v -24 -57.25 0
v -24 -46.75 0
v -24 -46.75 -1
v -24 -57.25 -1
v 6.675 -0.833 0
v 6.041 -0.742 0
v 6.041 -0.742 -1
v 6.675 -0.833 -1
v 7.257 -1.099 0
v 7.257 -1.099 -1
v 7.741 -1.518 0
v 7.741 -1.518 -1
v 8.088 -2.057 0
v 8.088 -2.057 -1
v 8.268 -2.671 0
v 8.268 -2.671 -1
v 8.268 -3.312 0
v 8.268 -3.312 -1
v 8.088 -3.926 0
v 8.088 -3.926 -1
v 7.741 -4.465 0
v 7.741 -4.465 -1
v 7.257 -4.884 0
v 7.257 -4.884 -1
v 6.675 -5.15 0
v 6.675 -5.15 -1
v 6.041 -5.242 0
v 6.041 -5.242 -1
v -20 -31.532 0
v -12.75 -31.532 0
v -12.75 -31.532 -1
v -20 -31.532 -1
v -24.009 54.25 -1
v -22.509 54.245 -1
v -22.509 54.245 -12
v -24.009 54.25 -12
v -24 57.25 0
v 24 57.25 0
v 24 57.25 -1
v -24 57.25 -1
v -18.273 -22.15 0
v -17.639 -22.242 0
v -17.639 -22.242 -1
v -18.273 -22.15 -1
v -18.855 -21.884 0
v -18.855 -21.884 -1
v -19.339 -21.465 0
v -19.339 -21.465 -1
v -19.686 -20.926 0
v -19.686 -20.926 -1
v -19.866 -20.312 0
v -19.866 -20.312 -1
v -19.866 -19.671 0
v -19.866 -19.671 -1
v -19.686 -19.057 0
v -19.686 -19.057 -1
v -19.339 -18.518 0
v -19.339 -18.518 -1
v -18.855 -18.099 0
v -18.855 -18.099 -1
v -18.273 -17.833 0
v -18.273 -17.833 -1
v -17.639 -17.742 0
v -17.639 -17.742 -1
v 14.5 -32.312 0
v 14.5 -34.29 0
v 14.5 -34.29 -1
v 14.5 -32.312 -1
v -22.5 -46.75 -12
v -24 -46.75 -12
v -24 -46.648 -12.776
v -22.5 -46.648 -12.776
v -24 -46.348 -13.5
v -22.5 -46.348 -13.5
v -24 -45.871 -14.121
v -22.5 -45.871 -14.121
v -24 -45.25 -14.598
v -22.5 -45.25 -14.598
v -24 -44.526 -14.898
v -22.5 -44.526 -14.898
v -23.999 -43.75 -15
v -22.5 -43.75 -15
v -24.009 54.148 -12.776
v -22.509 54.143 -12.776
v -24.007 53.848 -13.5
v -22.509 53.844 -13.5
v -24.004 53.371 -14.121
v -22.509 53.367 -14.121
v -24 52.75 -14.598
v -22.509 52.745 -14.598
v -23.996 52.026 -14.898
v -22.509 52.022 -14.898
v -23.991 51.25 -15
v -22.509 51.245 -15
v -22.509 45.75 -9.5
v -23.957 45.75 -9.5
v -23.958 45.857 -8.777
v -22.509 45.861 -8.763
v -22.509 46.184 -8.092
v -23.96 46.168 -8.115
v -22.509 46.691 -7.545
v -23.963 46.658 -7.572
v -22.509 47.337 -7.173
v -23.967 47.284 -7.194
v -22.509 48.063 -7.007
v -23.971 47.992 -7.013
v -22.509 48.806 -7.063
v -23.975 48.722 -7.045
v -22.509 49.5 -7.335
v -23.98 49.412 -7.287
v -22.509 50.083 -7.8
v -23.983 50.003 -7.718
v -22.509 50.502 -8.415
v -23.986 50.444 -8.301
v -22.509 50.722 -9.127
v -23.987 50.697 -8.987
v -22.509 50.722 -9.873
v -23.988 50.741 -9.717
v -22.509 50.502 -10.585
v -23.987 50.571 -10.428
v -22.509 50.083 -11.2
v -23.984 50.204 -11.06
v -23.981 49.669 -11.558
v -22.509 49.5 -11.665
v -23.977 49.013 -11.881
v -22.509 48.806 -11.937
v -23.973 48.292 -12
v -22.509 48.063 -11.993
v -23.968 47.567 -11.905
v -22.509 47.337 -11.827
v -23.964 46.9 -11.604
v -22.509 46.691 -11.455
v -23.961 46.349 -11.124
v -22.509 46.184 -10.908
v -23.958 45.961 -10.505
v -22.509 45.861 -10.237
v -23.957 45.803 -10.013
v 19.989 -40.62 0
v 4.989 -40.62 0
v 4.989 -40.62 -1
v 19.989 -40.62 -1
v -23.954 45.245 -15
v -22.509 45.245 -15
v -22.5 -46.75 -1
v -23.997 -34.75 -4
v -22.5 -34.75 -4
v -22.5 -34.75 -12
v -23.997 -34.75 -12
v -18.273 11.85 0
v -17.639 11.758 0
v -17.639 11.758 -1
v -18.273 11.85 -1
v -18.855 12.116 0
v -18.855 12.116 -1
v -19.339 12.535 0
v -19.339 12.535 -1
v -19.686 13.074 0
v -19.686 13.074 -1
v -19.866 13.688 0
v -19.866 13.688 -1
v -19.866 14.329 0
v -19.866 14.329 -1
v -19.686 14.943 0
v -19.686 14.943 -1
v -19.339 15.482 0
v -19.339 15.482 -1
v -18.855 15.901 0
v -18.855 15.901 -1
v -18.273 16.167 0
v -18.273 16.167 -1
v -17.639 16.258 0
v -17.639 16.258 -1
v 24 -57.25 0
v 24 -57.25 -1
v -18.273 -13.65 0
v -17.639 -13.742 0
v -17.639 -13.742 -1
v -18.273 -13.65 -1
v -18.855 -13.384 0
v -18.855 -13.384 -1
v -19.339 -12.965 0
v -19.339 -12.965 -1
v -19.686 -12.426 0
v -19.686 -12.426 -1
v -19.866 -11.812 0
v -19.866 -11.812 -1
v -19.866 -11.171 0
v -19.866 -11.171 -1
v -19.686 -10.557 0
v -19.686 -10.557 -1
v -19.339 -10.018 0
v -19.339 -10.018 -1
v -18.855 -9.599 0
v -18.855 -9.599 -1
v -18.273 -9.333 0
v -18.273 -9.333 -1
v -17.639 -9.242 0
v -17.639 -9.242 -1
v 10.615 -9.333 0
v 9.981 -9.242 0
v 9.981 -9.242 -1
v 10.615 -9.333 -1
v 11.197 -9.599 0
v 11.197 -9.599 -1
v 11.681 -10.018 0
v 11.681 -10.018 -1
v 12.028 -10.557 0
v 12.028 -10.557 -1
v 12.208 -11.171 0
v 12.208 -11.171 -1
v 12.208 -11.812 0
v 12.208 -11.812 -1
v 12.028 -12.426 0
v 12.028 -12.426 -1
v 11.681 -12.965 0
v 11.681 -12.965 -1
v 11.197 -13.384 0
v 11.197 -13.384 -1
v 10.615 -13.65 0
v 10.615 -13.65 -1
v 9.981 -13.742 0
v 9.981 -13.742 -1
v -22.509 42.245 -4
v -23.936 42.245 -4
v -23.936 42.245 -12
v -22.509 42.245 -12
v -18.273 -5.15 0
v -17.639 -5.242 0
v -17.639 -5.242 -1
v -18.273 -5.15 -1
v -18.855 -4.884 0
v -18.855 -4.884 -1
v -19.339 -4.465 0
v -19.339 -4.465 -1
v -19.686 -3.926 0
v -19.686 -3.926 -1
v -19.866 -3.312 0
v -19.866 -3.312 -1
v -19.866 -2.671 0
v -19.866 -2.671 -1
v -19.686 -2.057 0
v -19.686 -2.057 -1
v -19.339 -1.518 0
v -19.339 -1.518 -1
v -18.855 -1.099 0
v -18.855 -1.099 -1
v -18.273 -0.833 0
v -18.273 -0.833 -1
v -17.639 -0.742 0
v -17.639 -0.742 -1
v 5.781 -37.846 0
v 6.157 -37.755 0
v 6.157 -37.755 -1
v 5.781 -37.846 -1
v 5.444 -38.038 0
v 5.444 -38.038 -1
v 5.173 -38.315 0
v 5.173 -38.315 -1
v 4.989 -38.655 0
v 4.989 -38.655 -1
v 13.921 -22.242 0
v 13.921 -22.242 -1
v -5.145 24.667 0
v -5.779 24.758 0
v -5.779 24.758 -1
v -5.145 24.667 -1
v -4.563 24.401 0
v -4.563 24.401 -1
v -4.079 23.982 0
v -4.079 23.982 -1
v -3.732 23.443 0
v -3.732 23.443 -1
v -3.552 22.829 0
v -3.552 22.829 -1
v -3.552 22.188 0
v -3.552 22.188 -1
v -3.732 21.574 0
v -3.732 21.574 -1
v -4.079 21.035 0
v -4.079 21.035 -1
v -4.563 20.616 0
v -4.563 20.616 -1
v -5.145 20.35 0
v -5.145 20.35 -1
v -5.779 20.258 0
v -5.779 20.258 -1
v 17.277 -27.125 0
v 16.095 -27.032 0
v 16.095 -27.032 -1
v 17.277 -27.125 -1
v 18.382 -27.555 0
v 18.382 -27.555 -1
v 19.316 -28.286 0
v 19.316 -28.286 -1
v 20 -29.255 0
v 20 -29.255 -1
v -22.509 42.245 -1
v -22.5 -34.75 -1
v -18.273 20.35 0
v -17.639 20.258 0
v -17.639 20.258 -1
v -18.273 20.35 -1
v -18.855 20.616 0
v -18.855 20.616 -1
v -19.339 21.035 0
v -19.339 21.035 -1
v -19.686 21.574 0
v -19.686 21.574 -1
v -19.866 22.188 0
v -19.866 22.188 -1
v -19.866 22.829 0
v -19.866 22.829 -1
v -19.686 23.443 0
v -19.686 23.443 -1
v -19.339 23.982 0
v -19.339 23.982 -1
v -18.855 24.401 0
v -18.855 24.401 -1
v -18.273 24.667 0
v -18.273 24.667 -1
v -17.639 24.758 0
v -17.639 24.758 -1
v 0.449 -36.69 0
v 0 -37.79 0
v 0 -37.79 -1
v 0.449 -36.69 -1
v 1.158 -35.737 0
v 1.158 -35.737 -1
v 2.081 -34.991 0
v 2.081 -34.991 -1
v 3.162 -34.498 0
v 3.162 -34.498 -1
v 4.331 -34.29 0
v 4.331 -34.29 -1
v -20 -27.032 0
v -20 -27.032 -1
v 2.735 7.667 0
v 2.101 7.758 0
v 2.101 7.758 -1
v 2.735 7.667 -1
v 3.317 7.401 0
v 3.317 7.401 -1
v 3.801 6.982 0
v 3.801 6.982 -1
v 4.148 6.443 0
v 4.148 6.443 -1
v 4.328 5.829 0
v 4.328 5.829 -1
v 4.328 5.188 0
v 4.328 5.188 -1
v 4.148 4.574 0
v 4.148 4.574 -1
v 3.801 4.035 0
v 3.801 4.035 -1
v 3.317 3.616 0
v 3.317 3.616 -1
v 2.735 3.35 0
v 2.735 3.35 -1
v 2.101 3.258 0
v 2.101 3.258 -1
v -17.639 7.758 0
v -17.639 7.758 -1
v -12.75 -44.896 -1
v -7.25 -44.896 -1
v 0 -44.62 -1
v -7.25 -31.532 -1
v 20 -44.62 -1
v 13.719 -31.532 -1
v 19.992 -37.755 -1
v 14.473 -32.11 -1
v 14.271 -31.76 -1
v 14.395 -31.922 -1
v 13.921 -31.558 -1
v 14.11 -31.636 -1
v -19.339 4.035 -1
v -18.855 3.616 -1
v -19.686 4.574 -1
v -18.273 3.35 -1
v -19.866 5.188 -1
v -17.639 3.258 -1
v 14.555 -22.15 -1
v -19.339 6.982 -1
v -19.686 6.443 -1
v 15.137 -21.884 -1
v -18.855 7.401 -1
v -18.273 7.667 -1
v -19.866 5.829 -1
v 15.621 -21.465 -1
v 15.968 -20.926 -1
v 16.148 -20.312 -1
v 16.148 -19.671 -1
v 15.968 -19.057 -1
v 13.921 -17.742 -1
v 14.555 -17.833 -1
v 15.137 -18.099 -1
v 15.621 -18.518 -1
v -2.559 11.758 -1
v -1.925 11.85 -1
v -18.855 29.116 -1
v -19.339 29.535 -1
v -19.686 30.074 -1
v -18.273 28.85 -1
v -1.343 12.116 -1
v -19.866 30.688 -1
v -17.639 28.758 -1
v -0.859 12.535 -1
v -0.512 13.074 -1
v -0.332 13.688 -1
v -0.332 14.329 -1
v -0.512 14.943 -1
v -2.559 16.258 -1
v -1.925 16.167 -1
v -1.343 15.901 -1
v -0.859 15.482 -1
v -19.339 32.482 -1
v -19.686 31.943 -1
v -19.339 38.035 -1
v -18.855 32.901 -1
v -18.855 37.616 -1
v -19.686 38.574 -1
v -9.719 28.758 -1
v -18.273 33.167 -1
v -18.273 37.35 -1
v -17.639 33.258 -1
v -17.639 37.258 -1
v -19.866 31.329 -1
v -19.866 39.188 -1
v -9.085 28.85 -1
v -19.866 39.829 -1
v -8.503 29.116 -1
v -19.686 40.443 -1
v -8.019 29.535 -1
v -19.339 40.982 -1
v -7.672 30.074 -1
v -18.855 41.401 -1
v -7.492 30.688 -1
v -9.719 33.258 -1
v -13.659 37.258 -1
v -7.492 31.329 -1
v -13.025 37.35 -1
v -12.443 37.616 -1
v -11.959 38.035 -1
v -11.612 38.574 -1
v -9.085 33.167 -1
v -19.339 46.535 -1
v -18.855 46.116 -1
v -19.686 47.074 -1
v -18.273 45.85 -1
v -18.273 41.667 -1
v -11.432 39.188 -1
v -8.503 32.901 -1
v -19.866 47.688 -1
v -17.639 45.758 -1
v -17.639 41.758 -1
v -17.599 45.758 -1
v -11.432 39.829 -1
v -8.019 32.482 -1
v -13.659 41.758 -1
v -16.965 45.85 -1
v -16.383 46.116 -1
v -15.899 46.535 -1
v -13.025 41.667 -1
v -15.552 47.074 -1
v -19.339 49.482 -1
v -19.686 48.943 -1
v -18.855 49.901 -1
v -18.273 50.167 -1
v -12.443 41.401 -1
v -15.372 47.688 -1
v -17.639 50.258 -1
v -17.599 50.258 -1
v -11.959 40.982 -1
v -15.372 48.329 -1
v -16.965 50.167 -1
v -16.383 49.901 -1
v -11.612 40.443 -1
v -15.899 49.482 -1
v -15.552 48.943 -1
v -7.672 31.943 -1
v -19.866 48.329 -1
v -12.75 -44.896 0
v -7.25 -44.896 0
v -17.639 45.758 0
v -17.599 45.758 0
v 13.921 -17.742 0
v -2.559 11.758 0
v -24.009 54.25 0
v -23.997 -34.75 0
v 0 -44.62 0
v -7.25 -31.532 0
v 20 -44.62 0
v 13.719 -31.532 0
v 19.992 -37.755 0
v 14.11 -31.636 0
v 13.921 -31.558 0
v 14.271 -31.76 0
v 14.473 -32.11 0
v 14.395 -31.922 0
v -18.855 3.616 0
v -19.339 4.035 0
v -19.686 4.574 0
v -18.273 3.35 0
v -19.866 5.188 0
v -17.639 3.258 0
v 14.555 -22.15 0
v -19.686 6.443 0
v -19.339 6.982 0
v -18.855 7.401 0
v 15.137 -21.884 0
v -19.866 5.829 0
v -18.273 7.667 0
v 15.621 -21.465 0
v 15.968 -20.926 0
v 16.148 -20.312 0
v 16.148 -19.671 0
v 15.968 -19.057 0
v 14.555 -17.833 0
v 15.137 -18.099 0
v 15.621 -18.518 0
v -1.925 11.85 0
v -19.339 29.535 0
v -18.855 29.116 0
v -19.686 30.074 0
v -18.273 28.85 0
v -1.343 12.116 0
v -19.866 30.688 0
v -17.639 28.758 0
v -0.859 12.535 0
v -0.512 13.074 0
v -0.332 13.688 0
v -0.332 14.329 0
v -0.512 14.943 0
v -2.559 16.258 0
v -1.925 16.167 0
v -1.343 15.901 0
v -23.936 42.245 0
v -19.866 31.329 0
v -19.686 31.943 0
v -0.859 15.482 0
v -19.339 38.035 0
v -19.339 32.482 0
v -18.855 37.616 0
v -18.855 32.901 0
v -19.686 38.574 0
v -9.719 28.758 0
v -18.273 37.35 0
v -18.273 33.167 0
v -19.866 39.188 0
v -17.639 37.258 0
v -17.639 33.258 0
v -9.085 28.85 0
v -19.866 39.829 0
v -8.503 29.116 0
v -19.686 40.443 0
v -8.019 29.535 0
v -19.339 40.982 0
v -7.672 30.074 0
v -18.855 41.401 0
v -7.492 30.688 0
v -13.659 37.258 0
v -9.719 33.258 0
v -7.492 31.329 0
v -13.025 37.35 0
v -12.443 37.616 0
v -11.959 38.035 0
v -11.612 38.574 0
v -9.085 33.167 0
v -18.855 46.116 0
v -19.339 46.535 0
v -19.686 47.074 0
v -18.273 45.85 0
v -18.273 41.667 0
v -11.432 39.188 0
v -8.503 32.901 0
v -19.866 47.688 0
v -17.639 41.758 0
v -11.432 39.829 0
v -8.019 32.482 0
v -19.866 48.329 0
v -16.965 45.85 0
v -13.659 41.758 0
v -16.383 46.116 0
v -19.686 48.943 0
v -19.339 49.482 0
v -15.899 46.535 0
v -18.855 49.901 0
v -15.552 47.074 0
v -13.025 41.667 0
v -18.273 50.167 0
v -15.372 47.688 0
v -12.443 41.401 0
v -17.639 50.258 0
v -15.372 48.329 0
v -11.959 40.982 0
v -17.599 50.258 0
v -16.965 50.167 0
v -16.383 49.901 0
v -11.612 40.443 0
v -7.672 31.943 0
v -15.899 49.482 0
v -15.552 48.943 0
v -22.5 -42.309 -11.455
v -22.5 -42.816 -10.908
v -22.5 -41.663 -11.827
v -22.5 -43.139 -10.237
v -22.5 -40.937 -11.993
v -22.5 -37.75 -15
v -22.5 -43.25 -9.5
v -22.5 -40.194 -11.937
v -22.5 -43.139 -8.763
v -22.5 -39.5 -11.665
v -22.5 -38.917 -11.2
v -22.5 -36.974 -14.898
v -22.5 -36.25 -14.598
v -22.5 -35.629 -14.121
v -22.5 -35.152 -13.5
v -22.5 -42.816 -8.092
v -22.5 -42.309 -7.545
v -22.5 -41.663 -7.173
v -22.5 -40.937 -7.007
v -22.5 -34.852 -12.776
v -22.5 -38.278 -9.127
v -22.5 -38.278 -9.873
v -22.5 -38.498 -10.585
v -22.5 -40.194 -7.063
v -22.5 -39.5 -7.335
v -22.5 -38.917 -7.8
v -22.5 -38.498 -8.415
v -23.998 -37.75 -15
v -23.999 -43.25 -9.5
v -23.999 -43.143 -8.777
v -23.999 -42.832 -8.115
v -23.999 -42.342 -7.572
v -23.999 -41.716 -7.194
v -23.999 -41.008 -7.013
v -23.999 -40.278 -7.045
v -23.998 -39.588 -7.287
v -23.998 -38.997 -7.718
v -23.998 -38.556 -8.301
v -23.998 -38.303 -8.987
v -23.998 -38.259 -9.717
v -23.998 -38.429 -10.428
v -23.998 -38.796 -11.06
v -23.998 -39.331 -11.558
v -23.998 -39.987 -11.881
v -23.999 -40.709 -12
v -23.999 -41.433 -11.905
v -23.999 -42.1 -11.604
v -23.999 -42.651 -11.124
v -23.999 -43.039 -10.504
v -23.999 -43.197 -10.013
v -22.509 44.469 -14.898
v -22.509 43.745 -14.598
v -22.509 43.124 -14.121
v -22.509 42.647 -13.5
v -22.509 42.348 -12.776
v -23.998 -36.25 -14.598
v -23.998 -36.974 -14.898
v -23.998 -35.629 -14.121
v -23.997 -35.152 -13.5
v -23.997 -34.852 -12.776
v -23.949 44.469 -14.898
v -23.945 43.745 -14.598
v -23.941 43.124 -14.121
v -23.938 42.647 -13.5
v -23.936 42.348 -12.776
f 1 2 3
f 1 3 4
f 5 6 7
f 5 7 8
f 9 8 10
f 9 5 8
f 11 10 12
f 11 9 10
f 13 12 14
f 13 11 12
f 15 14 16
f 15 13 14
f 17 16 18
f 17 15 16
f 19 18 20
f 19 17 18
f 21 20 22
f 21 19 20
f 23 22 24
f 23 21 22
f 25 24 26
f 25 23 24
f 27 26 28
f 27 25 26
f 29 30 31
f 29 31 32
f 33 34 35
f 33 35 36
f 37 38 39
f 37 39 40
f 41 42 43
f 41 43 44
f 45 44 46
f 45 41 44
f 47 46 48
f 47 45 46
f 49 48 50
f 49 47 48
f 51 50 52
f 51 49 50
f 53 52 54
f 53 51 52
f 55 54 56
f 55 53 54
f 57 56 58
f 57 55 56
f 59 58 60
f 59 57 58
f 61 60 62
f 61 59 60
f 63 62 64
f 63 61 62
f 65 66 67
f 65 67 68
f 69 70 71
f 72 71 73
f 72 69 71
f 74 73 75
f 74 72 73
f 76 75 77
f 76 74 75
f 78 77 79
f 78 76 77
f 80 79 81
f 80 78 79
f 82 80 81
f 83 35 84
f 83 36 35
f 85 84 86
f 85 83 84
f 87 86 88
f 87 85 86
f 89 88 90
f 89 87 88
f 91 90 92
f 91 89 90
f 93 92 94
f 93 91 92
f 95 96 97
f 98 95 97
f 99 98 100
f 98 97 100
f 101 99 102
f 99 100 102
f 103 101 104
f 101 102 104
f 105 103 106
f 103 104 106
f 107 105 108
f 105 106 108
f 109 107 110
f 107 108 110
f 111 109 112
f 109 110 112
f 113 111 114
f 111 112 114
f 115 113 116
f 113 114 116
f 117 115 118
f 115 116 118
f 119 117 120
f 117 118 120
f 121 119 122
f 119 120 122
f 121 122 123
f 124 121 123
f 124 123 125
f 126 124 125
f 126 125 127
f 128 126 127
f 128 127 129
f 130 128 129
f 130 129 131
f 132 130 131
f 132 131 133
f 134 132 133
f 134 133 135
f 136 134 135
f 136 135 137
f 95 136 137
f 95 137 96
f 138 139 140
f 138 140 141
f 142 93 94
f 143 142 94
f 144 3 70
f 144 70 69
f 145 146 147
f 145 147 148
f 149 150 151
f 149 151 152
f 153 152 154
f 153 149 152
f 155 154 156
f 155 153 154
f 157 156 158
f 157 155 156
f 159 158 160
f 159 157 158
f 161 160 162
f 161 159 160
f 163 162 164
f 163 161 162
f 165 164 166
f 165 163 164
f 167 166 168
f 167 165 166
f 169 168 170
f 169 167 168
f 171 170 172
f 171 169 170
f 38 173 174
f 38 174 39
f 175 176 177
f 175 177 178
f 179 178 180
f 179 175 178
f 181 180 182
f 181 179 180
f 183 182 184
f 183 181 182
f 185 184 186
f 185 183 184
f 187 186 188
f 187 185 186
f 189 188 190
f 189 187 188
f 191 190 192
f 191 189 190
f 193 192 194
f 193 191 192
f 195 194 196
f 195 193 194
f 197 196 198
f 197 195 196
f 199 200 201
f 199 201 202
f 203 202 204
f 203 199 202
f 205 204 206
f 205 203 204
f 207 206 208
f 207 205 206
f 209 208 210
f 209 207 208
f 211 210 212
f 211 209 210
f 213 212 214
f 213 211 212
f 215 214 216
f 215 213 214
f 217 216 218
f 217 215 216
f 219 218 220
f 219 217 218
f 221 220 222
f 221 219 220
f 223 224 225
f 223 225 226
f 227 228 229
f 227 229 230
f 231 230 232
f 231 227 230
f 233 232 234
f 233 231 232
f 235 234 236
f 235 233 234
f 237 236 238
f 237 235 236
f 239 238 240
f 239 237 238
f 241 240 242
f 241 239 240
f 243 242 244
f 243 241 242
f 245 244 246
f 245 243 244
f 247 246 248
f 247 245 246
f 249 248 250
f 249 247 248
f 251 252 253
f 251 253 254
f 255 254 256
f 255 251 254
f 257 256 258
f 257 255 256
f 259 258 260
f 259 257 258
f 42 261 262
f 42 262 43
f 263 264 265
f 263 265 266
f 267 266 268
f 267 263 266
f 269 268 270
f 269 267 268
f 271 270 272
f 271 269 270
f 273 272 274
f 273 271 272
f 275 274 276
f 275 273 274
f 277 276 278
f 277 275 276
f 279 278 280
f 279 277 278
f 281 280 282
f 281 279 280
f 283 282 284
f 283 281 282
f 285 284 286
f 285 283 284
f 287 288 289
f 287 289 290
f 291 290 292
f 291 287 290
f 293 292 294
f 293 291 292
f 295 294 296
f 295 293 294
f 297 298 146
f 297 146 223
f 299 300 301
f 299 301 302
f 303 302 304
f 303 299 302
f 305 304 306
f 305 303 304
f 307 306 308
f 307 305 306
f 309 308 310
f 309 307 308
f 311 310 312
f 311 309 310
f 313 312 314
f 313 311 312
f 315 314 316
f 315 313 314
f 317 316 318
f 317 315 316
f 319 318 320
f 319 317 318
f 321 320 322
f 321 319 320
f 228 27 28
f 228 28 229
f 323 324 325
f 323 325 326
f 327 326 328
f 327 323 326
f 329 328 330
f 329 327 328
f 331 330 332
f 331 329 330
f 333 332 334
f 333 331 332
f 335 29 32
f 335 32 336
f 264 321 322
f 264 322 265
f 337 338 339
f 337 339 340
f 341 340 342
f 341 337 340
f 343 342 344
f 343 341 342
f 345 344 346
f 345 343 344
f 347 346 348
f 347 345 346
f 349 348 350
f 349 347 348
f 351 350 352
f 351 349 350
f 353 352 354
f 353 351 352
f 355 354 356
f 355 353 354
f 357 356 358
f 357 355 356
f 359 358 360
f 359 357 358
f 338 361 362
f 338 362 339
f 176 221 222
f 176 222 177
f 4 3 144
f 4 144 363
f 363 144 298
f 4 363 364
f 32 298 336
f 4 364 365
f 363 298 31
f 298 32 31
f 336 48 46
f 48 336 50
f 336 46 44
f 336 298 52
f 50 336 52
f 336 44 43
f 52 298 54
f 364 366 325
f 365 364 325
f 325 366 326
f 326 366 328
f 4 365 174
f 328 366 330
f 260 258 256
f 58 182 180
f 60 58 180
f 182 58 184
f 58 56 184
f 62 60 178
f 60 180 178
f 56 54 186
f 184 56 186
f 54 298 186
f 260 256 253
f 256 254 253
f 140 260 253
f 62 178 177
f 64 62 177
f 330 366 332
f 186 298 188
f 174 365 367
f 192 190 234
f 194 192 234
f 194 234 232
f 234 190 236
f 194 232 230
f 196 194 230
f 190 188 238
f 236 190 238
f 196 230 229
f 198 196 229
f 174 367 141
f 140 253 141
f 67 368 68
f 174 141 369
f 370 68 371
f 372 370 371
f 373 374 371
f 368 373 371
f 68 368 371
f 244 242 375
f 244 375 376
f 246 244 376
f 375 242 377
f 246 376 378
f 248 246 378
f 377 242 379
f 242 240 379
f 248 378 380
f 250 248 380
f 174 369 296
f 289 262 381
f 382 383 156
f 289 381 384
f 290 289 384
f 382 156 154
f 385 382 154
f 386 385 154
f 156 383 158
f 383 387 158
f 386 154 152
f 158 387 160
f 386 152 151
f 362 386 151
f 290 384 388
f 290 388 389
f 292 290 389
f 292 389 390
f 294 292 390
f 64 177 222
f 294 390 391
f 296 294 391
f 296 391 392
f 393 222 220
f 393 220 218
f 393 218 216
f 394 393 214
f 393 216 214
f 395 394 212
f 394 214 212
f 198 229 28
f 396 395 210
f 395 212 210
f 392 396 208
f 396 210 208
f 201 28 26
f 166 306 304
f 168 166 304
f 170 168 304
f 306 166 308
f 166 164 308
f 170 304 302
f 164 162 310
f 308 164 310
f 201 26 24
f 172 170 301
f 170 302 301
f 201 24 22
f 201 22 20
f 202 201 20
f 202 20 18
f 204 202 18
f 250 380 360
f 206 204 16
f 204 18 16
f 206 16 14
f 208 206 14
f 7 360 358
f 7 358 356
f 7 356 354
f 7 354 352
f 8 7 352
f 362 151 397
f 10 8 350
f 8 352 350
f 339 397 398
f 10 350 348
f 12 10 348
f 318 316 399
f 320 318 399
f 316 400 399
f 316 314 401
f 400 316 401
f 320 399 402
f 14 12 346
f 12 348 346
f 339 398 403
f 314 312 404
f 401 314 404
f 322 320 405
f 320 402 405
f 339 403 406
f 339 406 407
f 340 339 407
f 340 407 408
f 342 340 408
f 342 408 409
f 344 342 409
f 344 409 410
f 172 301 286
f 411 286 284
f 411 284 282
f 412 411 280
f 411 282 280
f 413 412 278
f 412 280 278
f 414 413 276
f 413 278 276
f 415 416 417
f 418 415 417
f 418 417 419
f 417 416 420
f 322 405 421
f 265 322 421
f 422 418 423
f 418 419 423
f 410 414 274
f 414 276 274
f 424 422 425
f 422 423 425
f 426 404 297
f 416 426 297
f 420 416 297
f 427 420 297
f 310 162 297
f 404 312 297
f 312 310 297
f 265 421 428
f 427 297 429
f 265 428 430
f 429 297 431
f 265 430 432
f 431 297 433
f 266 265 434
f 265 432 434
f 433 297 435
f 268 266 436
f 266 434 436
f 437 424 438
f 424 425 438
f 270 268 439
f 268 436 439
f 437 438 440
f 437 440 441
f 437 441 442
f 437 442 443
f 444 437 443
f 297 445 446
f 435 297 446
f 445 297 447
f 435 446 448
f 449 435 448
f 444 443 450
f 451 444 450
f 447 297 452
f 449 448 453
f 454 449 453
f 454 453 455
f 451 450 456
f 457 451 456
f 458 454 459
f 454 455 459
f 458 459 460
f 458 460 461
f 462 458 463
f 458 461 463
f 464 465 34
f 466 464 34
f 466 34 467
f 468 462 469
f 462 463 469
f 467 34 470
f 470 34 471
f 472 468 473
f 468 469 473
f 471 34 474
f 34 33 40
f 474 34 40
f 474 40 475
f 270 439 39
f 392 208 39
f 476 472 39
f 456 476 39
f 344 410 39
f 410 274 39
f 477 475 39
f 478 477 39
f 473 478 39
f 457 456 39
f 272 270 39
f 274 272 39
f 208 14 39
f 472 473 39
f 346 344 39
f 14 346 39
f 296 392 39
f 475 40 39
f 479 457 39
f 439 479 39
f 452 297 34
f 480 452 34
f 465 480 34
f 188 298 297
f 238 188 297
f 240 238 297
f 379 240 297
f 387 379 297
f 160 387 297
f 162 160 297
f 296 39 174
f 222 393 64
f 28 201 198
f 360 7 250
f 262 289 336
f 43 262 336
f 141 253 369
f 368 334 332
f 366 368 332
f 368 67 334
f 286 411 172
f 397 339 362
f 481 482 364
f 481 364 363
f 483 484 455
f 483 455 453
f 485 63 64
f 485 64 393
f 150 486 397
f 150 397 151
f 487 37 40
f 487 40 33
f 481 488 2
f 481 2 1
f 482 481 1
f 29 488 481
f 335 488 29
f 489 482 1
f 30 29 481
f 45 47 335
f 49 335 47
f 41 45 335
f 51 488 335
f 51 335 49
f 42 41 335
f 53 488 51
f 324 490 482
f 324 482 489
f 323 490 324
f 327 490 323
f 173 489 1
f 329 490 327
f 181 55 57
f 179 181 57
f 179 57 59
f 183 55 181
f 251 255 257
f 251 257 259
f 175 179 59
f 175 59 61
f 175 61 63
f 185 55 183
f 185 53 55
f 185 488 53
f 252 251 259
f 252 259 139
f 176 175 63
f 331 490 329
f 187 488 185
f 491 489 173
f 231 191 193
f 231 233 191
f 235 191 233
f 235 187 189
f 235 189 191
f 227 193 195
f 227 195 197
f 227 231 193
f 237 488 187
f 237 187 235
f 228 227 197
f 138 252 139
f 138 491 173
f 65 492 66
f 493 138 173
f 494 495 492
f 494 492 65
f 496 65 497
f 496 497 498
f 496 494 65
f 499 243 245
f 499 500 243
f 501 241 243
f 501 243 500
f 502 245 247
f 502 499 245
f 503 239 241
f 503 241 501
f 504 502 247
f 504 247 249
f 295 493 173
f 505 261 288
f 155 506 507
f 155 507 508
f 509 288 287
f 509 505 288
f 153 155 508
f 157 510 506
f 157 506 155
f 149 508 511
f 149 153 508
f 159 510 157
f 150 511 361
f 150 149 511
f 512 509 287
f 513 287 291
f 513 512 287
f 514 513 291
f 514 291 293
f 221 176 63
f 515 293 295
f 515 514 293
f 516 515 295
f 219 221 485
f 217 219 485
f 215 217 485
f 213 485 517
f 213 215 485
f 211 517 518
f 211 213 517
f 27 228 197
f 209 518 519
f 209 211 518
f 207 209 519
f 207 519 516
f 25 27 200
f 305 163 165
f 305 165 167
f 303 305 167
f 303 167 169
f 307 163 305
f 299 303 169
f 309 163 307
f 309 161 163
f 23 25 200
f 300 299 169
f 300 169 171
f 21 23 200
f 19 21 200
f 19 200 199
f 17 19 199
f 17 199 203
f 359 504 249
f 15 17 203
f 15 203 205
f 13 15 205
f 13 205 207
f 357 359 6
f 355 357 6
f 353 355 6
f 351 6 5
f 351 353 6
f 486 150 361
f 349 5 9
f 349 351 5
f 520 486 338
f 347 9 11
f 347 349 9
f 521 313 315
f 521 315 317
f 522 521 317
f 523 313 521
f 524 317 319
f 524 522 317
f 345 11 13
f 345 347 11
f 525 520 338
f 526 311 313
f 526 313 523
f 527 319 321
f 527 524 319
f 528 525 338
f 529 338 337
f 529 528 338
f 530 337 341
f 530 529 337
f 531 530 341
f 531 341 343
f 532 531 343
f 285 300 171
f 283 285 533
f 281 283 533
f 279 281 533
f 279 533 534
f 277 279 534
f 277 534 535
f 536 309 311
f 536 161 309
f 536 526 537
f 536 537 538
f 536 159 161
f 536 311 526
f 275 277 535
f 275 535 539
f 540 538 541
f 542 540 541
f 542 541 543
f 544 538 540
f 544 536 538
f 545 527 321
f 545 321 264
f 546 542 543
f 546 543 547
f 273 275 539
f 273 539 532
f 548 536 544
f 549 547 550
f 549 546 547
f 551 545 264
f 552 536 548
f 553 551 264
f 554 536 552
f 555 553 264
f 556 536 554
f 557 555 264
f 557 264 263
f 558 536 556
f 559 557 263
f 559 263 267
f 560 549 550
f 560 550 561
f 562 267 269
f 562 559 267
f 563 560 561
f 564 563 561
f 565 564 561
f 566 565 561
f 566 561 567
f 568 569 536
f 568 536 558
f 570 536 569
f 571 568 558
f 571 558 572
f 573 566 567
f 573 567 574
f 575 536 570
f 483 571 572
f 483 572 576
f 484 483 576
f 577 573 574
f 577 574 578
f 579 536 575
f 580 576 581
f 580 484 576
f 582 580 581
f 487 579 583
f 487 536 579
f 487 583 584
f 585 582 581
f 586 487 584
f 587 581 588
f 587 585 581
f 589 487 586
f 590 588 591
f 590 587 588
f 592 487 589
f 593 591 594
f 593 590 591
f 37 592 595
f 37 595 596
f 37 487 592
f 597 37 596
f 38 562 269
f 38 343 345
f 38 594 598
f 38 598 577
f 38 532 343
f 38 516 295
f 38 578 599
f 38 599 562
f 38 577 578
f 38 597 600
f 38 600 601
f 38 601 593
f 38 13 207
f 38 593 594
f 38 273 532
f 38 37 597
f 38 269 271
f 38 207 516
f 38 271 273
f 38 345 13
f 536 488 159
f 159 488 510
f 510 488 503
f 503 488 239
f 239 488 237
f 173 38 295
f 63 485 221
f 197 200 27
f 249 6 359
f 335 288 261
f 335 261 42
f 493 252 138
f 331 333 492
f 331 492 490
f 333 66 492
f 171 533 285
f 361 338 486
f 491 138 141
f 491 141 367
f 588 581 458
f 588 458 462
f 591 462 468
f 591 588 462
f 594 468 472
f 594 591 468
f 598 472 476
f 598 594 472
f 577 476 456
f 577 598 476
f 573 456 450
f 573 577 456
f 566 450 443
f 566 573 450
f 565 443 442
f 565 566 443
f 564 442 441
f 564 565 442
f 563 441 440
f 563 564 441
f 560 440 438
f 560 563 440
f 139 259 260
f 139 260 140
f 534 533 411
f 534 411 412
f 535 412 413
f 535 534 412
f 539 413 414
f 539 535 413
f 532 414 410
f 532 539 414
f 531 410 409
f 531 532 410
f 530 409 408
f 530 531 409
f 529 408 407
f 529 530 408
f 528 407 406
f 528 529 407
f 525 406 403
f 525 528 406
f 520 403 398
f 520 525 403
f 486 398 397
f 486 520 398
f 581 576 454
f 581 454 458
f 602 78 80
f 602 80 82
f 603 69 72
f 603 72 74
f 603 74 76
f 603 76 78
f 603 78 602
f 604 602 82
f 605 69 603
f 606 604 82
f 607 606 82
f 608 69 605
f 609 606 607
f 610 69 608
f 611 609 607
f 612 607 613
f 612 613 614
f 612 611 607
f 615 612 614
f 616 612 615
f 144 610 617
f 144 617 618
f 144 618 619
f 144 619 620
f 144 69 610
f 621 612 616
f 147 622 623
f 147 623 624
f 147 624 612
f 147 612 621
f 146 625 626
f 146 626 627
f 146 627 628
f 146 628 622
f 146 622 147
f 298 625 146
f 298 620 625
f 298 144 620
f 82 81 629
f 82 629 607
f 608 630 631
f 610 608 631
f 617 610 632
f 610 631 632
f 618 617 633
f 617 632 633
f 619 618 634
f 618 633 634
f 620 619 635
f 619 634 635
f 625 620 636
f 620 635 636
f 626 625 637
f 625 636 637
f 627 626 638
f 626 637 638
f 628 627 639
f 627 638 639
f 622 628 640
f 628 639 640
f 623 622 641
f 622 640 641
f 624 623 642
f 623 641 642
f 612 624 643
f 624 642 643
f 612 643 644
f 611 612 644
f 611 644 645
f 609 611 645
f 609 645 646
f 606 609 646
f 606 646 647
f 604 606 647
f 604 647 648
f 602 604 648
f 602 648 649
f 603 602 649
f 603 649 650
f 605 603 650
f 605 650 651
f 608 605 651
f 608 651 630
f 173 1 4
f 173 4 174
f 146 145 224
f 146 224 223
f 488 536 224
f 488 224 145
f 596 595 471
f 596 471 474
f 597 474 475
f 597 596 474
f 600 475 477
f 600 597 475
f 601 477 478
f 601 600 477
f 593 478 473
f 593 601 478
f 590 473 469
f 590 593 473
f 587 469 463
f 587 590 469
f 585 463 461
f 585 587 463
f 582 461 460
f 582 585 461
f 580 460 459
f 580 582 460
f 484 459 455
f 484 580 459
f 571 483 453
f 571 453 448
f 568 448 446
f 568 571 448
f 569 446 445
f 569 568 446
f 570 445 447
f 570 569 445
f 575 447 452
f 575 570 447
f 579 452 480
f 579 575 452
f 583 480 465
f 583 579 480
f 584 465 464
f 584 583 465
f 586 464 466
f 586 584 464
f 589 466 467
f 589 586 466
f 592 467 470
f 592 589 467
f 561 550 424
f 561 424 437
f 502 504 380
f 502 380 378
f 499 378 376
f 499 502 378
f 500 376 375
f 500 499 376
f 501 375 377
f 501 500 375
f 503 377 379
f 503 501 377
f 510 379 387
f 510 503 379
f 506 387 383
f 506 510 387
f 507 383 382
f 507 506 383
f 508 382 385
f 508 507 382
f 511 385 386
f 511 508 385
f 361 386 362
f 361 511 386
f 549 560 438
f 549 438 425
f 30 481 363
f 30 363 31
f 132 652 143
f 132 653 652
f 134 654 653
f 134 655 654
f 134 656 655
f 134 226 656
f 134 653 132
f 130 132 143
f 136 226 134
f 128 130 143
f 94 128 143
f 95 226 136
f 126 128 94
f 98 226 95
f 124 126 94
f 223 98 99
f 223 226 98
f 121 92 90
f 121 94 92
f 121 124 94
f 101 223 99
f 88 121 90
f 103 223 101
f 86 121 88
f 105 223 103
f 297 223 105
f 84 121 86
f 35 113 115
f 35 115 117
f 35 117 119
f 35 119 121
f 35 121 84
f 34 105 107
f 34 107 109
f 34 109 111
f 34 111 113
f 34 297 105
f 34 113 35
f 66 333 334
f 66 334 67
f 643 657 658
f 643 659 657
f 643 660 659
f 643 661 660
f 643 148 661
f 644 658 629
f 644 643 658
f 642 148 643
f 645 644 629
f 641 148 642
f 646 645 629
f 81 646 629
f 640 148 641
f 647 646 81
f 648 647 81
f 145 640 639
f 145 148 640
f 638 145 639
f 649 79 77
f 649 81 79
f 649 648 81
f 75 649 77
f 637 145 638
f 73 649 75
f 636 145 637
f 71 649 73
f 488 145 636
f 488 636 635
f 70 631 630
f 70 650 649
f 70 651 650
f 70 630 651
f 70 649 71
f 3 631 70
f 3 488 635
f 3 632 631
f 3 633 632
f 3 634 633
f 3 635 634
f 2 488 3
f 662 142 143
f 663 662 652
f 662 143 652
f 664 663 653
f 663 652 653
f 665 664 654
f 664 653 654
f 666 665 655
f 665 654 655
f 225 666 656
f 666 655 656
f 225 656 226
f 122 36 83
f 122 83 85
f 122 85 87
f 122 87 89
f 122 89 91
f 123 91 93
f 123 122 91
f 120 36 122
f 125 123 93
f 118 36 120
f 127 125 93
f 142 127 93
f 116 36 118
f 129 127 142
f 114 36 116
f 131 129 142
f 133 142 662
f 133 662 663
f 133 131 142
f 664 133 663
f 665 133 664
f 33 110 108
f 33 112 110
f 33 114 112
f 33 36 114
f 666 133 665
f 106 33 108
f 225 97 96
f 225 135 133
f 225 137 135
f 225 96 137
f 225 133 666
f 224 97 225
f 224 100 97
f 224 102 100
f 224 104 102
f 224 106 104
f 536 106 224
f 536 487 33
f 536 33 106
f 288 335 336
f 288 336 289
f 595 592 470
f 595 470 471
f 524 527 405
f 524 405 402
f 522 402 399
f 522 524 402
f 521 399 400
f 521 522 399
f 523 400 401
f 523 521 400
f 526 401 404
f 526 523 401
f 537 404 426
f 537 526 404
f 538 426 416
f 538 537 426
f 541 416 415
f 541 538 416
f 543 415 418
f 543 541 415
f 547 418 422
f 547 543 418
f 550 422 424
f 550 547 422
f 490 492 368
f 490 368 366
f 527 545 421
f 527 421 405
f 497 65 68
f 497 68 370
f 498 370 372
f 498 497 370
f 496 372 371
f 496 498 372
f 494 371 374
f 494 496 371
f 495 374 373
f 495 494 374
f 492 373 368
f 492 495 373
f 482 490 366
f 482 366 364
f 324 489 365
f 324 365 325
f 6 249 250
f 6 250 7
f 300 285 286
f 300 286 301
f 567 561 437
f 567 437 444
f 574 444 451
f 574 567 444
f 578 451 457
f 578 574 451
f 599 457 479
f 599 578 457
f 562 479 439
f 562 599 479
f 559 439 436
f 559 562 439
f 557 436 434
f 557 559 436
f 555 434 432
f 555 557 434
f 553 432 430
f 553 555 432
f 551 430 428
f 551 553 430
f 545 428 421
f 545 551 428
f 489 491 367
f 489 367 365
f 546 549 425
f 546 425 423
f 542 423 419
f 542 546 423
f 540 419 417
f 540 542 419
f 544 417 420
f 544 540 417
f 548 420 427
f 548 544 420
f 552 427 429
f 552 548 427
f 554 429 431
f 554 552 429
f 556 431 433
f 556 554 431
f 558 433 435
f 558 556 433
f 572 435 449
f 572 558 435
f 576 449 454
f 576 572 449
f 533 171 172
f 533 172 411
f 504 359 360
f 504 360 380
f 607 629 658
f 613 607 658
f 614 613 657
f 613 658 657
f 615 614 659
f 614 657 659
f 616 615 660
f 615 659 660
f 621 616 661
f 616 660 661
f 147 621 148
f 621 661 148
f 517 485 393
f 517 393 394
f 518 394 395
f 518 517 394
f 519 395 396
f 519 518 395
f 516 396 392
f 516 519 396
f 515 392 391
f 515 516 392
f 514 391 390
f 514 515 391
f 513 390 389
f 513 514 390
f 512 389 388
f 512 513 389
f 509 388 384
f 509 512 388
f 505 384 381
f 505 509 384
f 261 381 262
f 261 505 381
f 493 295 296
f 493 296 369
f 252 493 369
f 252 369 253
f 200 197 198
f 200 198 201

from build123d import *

# Parameters (mm, degrees)
F1_DEPTH = 1
F2_DEPTH = 15
F4_D     = 5
F5_R     = 3
F6_DEPTH = 4


# Not quite as in the source:
# - a feature names something its author has since deleted; it is built from what else it names


with BuildPart() as f1:
    # F0 (on Top) → F1 (new body)
    with BuildSketch(Plane.XY):
        Polygon((24, 57.25), (-24, 57.25), (-24.0091441598, 54.25), (-22.5091511277, 54.2454279414), (-22.5091511277, 42.2454279414), (-22.5, -34.75), (-22.5, -46.75), (-24, -46.75), (-24, -57.25), (24, -57.25), align=None)
        with BuildLine():
            Line((13.9209458456, -22.2416133583), (-17.6390541544, -22.2416133583))
            ThreePointArc((-17.6390541544, -22.2416133583), (-19.8890541544, -19.9916133583), (-17.6390541544, -17.7416133583))
            Line((-17.6390541544, -17.7416133583), (13.9209458456, -17.7416133583))
            ThreePointArc((13.9209458456, -17.7416133583), (16.1709458456, -19.9916133583), (13.9209458456, -22.2416133583))
        make_face(mode=Mode.SUBTRACT)
        with BuildLine():
            Line((9.9809458456, -13.7416133583), (-17.6390541544, -13.7416133583))
            ThreePointArc((-17.6390541544, -13.7416133583), (-19.8890541544, -11.4916133583), (-17.6390541544, -9.2416133583))
            Line((-17.6390541544, -9.2416133583), (9.9809458456, -9.2416133583))
            ThreePointArc((9.9809458456, -9.2416133583), (12.2309458456, -11.4916133583), (9.9809458456, -13.7416133583))
        make_face(mode=Mode.SUBTRACT)
        with BuildLine():
            Line((6.0409458456, -5.2416133583), (-17.6390541544, -5.2416133583))
            ThreePointArc((-17.6390541544, -5.2416133583), (-19.8890541544, -2.9916133583), (-17.6390541544, -0.7416133583))
            Line((-17.6390541544, -0.7416133583), (6.0409458456, -0.7416133583))
            ThreePointArc((6.0409458456, -0.7416133583), (8.2909458456, -2.9916133583), (6.0409458456, -5.2416133583))
        make_face(mode=Mode.SUBTRACT)
        with BuildLine():
            Line((-19.9999999992, -31.5317022603), (-19.9999999992, -27.0317022603))
            Line((-19.9999999992, -27.0317022603), (16.0951670268, -27.0317022603))
            ThreePointArc((16.0951670268, -27.0317022603), (18.3824934665, -27.555243649), (19.9999999704, -29.25513498))
            Line((19.9999999704, -29.25513498), (19.991580365, -37.75513498))
            Line((19.991580365, -37.75513498), (6.1573753969, -37.7551350426))
            ThreePointArc((6.1573753969, -37.7551350426), (5.4441089744, -38.037790108), (4.9890264818, -38.6554816172))
            Line((4.9890264818, -38.6554816172), (4.9890264818, -40.6197120801))
            Line((4.9890264818, -40.6197120801), (19.9890264818, -40.6197120801))
            Line((19.9890264818, -40.6197120801), (20, -44.6197120801))
            Line((20, -44.6197120801), (0, -44.6197120801))
            Line((0, -44.6197120801), (0, -37.7900532508))
            ThreePointArc((0, -37.7900532508), (1.5958871284, -35.3350022858), (4.3312619815, -34.2900834468))
            Line((4.3312619815, -34.2900834468), (14.5000001306, -34.2900834468))
            Line((14.5000001306, -34.2900834468), (14.5000000048, -32.3122422563))
            ThreePointArc((14.5000000048, -32.3122422563), (14.2713851276, -31.7603171319), (13.7194600008, -31.5317022603))
            Line((13.7194600008, -31.5317022603), (-7.2499999992, -31.5317022603))
            Line((-7.2499999992, -31.5317022603), (-7.2499999992, -44.8960133593))
            Line((-7.2499999992, -44.8960133593), (-12.7499999992, -44.8960133593))
            Line((-12.7499999992, -44.8960133593), (-12.7499999992, -31.5317022603))
            Line((-12.7499999992, -31.5317022603), (-19.9999999992, -31.5317022603))
        make_face(mode=Mode.SUBTRACT)
        with BuildLine():
            Line((2.1009458456, 3.2583866417), (-17.6390541544, 3.2583866417))
            ThreePointArc((-17.6390541544, 3.2583866417), (-19.8890541544, 5.5083866417), (-17.6390541544, 7.7583866417))
            Line((-17.6390541544, 7.7583866417), (2.1009458456, 7.7583866417))
            ThreePointArc((2.1009458456, 7.7583866417), (4.3509458456, 5.5083866417), (2.1009458456, 3.2583866417))
        make_face(mode=Mode.SUBTRACT)
        with BuildLine():
            Line((-2.5590541544, 11.7583866417), (-17.6390541544, 11.7583866417))
            ThreePointArc((-17.6390541544, 11.7583866417), (-19.8890541544, 14.0083866417), (-17.6390541544, 16.2583866417))
            Line((-17.6390541544, 16.2583866417), (-2.5590541544, 16.2583866417))
            ThreePointArc((-2.5590541544, 16.2583866417), (-0.3090541544, 14.0083866417), (-2.5590541544, 11.7583866417))
        make_face(mode=Mode.SUBTRACT)
        with BuildLine():
            Line((-5.7790541544, 20.2583866417), (-17.6390541544, 20.2583866417))
            ThreePointArc((-17.6390541544, 20.2583866417), (-19.8890541544, 22.5083866417), (-17.6390541544, 24.7583866417))
            Line((-17.6390541544, 24.7583866417), (-5.7790541544, 24.7583866417))
            ThreePointArc((-5.7790541544, 24.7583866417), (-3.5290541544, 22.5083866417), (-5.7790541544, 20.2583866417))
        make_face(mode=Mode.SUBTRACT)
        with BuildLine():
            Line((-9.7190541544, 28.7583866417), (-17.6390541544, 28.7583866417))
            ThreePointArc((-17.6390541544, 28.7583866417), (-19.8890541544, 31.0083866417), (-17.6390541544, 33.2583866417))
            Line((-17.6390541544, 33.2583866417), (-9.7190541544, 33.2583866417))
            ThreePointArc((-9.7190541544, 33.2583866417), (-7.4690541544, 31.0083866417), (-9.7190541544, 28.7583866417))
        make_face(mode=Mode.SUBTRACT)
        with BuildLine():
            Line((-13.6590541544, 37.2583866417), (-17.6390541544, 37.2583866417))
            ThreePointArc((-17.6390541544, 37.2583866417), (-19.8890541544, 39.5083866417), (-17.6390541544, 41.7583866417))
            Line((-17.6390541544, 41.7583866417), (-13.6590541544, 41.7583866417))
            ThreePointArc((-13.6590541544, 41.7583866417), (-11.4090541544, 39.5083866417), (-13.6590541544, 37.2583866417))
        make_face(mode=Mode.SUBTRACT)
        with BuildLine():
            Line((-17.5990541544, 45.7583866417), (-17.6390541544, 45.7583866417))
            ThreePointArc((-17.6390541544, 45.7583866417), (-19.8890541544, 48.0083866417), (-17.6390541544, 50.2583866417))
            Line((-17.6390541544, 50.2583866417), (-17.5990541544, 50.2583866417))
            ThreePointArc((-17.5990541544, 50.2583866417), (-15.3490541544, 48.0083866417), (-17.5990541544, 45.7583866417))
        make_face(mode=Mode.SUBTRACT)
    extrude(amount=-F1_DEPTH)

    # F0 (on Top) → F2 (join)
    with BuildSketch(Plane.XY):
        Polygon((-22.5091511277, 54.2454279414), (-24.0091441598, 54.25), (-23.9357289877, 42.2454279414), (-22.5091511277, 42.2454279414), align=None)
        Polygon((-22.5, -34.75), (-23.997312058, -34.750000301), (-24, -46.75), (-22.5, -46.75), align=None)
    extrude(amount=-F2_DEPTH)

    # F4 (through all)
    with Locations(Plane.YZ):
        with Locations((-40.75, -9.5), (48.25, -9.5)):
            Hole(F4_D / 2)

    # F5
    f5_edges = [f1.edges().sort_by_distance(p)[0] for p in [
        (-23.22244, 42.245428, -15),
        (-23.259148, 54.247714, -15),
        (-23.248656, -34.75, -15),
        (-23.25, -46.75, -15),
    ]]
    fillet(f5_edges, radius=F5_R)

    # F0 (on Top) → F6 (join)
    with BuildSketch(Plane.XY):
        Polygon((-22.5091511277, 42.2454279414), (-23.9357289877, 42.2454279414), (-23.997312058, -34.750000301), (-22.5, -34.75), align=None)
    extrude(amount=-F6_DEPTH)


solid = f1.part
